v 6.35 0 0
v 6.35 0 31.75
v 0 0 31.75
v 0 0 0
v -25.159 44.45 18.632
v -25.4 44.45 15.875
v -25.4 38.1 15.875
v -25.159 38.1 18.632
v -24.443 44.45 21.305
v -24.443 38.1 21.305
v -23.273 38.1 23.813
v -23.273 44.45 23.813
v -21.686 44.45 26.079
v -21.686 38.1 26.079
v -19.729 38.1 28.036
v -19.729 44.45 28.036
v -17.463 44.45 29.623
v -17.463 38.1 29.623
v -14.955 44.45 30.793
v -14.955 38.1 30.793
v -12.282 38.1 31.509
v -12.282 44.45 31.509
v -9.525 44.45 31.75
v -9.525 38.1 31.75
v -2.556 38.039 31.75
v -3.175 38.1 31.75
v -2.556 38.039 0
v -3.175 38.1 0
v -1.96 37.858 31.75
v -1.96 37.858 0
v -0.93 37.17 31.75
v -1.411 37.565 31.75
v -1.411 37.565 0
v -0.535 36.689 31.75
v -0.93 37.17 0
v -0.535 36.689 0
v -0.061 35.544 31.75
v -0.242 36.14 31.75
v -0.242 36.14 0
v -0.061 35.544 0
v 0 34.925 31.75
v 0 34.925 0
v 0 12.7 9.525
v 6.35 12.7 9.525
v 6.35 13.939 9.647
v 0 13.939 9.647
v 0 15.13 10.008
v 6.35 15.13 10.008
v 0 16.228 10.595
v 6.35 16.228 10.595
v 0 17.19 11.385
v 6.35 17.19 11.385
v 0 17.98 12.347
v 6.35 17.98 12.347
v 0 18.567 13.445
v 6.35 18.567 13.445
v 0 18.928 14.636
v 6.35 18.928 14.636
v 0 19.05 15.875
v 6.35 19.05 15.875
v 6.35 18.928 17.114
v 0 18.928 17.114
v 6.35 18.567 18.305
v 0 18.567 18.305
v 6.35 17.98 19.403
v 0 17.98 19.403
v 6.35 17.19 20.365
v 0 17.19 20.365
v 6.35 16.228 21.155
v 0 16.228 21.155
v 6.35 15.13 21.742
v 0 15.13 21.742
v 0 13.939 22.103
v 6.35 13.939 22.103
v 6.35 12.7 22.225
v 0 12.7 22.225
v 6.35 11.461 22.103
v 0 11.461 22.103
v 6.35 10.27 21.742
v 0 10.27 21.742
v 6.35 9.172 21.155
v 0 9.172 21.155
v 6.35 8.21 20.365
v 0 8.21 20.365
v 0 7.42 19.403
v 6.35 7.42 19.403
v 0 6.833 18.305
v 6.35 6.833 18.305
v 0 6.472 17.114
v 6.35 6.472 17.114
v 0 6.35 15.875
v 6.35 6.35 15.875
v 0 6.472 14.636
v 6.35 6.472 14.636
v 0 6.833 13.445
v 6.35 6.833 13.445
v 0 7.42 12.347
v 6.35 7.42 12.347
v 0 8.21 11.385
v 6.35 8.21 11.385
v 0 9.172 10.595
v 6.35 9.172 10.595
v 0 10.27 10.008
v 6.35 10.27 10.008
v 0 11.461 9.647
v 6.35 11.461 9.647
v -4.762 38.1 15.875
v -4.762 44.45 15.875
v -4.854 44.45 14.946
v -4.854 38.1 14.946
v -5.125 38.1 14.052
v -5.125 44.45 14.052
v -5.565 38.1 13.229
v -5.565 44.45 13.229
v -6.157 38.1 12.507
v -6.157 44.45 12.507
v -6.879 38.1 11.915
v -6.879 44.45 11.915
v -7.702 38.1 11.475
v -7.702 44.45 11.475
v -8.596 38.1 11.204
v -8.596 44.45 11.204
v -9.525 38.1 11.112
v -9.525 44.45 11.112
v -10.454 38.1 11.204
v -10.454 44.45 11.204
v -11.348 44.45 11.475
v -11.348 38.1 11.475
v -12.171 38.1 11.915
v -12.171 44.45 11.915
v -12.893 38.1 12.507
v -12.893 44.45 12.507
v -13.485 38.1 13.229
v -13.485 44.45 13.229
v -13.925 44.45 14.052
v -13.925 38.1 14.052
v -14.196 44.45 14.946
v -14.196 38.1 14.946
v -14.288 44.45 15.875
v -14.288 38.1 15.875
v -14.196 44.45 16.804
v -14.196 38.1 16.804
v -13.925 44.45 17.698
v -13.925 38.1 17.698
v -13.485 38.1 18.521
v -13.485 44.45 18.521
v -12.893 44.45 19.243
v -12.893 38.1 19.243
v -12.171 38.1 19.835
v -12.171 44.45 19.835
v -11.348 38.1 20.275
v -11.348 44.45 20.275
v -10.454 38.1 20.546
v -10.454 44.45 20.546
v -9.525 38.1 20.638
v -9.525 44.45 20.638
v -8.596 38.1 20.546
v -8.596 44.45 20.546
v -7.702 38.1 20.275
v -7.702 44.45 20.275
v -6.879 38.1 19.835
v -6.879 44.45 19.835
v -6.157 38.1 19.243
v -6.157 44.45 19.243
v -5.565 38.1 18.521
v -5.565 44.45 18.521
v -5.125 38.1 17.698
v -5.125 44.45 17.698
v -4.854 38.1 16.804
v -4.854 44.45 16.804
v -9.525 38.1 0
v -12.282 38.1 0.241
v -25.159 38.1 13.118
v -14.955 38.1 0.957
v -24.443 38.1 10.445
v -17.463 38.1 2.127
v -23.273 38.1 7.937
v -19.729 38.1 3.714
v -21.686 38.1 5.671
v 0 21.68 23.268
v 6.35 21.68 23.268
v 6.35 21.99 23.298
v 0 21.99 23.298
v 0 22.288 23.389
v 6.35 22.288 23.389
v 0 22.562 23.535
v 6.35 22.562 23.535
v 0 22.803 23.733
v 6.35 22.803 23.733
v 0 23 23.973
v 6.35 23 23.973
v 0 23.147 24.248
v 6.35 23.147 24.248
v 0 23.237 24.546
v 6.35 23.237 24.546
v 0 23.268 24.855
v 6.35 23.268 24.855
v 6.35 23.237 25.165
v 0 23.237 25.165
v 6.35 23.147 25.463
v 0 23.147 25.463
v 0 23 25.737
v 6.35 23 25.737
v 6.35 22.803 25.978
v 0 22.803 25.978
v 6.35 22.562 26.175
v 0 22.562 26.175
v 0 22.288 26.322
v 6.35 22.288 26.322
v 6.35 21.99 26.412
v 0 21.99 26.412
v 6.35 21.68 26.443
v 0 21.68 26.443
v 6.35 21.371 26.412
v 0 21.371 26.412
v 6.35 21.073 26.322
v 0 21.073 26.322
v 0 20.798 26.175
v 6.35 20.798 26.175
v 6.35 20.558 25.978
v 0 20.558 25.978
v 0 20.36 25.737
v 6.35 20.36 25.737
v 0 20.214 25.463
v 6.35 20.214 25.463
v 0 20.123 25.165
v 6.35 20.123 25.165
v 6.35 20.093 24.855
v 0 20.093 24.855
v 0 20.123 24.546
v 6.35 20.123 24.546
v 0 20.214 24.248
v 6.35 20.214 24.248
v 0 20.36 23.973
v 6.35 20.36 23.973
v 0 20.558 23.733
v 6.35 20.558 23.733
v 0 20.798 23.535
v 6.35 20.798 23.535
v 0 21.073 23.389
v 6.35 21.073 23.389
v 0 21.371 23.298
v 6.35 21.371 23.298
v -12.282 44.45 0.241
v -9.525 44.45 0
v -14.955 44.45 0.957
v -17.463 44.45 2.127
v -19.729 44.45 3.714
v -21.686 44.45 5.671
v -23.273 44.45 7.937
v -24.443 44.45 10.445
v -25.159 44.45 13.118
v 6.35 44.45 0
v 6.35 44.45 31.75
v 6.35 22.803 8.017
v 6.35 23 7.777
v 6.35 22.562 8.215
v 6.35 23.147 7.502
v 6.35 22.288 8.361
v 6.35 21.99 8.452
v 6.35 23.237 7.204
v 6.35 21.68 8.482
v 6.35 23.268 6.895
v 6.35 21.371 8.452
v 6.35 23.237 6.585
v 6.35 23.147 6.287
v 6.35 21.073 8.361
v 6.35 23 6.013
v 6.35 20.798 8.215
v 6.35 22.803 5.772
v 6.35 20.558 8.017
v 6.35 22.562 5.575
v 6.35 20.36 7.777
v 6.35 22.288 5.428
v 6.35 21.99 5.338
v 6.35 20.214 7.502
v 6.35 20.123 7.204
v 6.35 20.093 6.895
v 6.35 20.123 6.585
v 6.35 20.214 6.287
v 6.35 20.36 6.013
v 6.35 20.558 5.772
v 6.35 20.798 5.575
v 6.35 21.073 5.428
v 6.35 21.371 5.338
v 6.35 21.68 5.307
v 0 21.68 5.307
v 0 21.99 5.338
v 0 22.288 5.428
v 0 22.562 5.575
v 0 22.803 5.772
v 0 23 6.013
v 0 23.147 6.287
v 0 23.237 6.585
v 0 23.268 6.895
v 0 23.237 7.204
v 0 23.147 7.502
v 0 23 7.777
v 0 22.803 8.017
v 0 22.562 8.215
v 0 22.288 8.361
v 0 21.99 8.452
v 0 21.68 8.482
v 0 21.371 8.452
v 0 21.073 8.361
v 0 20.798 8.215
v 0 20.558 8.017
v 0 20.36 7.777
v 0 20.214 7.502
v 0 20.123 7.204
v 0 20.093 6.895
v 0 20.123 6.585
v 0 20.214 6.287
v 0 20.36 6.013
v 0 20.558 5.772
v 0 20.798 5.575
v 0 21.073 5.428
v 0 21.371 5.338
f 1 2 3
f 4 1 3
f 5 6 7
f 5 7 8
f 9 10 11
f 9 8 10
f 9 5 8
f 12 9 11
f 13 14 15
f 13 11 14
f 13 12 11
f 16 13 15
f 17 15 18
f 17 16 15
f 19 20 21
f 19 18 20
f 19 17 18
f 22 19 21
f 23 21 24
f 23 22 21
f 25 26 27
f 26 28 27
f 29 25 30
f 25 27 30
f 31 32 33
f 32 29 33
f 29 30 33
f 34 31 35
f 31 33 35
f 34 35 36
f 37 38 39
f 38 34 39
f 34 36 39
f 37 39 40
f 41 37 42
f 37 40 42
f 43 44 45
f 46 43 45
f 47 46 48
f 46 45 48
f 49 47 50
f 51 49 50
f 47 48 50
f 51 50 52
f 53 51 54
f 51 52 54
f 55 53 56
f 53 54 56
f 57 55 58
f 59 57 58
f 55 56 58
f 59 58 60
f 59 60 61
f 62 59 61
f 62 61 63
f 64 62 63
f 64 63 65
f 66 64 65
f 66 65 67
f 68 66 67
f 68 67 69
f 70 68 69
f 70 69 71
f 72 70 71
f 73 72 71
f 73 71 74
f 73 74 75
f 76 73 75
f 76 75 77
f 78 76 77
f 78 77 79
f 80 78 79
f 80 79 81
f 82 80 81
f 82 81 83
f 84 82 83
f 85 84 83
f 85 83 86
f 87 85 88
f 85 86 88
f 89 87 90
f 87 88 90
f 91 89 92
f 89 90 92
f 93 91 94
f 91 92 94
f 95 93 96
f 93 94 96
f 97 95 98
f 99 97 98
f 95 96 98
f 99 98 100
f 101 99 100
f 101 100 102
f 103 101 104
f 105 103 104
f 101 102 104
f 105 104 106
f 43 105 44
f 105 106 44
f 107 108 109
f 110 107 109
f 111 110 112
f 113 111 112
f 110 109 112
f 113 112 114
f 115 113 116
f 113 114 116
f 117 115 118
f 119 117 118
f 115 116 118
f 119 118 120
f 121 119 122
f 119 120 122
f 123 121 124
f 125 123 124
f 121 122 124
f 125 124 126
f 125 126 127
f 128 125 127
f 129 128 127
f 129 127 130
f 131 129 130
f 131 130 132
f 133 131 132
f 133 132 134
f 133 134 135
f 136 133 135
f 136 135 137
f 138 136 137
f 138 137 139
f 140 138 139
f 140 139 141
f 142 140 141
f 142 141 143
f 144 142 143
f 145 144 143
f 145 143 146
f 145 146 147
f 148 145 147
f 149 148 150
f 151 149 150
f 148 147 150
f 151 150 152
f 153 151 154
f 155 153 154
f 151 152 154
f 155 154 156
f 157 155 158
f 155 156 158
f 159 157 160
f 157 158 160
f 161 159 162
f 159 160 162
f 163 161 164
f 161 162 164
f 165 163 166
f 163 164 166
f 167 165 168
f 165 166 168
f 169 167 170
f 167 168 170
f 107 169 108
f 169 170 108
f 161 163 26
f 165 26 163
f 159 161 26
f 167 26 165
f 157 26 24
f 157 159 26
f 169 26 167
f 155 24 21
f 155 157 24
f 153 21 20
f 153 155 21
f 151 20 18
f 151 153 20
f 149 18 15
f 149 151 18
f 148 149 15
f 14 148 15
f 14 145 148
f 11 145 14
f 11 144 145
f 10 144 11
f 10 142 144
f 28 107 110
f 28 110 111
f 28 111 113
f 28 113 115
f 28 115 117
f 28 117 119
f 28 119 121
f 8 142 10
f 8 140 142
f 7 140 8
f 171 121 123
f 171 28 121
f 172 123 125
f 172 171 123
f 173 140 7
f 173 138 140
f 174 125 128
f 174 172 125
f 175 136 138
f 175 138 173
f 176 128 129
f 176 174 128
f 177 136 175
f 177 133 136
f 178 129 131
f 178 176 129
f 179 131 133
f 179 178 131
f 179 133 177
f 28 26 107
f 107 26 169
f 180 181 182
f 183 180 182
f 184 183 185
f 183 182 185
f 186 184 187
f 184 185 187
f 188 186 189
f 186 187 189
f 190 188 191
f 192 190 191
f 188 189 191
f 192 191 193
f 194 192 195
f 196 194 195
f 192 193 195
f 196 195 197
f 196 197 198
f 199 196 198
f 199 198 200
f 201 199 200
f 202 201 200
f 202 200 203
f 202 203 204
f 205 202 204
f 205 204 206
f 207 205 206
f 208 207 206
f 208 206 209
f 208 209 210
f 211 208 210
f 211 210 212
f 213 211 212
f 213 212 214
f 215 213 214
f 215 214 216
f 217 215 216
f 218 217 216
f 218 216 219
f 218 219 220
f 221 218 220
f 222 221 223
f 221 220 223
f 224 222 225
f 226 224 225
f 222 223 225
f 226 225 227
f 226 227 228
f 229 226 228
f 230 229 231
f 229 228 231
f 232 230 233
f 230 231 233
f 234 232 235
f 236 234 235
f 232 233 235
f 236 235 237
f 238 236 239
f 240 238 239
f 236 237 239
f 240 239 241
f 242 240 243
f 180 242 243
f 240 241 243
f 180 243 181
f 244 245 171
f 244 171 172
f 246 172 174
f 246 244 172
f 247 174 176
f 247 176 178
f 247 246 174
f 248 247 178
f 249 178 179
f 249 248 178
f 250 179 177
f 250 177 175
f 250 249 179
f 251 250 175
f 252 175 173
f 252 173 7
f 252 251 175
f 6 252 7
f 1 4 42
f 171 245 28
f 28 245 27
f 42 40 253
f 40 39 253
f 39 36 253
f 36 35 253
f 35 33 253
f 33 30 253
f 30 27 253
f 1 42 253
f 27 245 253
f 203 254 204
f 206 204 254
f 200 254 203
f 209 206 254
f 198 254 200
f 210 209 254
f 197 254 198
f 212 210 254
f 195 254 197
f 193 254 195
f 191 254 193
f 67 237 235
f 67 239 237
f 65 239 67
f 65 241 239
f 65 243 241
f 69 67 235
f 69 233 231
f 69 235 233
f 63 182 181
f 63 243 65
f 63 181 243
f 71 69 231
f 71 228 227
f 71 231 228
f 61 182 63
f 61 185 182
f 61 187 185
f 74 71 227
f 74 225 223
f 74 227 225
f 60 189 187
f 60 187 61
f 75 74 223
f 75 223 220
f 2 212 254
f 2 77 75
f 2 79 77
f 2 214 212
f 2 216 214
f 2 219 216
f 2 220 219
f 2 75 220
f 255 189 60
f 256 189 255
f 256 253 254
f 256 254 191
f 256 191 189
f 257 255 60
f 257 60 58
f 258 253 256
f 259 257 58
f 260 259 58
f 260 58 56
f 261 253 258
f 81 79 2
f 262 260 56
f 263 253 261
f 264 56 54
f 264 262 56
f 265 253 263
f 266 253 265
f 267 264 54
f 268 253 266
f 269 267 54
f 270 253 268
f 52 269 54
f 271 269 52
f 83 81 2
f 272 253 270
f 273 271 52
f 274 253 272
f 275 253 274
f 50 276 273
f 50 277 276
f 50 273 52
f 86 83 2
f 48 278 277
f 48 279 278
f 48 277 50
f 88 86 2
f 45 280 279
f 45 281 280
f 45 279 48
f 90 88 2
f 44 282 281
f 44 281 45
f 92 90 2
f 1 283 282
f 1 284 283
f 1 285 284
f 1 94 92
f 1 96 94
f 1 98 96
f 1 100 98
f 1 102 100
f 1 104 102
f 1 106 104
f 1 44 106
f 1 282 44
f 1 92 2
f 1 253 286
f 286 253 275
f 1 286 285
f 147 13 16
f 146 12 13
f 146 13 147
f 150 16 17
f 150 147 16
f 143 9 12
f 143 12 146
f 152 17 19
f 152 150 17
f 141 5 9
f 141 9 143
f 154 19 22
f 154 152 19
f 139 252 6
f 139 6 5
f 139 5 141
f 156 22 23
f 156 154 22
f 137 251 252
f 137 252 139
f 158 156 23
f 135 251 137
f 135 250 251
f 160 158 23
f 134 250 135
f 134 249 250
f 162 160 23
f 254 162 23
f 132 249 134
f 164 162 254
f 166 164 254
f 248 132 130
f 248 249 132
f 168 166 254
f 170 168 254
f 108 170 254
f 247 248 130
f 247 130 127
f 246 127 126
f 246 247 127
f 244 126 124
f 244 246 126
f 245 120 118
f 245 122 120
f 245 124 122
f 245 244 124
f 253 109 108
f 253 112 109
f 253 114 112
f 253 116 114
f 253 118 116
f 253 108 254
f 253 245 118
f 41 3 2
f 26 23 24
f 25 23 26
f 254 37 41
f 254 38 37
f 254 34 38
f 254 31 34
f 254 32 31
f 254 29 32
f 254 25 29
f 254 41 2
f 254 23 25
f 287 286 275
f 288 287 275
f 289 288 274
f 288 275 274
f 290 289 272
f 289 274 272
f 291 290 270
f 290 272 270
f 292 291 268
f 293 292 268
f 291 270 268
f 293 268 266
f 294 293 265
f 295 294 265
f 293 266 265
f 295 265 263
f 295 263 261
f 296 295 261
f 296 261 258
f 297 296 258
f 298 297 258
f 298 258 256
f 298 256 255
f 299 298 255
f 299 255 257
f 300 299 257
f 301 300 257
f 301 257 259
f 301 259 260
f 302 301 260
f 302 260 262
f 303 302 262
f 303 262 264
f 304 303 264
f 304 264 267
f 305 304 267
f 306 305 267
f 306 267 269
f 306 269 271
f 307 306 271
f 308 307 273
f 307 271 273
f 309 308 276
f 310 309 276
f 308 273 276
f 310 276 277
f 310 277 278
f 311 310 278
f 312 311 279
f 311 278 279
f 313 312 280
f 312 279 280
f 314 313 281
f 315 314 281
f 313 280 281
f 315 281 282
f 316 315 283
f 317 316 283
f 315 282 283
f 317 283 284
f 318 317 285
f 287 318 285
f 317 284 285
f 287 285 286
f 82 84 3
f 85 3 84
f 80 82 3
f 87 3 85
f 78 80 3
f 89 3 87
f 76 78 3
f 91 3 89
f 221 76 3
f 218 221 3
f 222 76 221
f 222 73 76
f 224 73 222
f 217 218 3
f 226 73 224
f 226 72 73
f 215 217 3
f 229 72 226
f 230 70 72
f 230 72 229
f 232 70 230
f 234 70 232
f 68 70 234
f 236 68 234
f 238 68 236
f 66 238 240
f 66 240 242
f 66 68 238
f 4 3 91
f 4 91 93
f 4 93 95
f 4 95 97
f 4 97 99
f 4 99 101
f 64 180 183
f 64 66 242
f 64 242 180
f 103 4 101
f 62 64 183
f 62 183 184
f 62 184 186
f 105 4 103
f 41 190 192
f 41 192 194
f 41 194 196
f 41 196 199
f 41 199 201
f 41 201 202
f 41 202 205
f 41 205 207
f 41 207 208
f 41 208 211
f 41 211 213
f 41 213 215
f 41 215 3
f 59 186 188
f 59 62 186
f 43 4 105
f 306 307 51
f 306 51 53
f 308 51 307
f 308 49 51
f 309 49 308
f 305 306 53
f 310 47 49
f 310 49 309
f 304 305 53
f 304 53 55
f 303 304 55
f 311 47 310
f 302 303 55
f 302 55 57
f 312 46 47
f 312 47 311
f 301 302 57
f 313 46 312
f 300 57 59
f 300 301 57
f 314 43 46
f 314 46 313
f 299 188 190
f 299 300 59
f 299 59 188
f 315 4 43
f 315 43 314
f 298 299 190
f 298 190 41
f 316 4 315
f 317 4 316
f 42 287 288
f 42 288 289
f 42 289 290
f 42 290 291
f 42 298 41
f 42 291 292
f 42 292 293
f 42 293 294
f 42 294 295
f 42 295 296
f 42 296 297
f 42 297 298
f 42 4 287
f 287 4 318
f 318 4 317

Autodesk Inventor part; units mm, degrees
ref_plane "YZ Plane" through (0, 0, 0) normal (1, 0, 0) x (0, 1, 0)
ref_plane "XZ Plane" through (0, 0, 0) normal (0, 1, 0) x (-1, 0, 0)
ref_plane "XY Plane" through (0, 0, 0) normal (0, 0, 1) x (1, 0, 0)
sketch "Sketch1" plane through (0, 0, 0) normal (0, 0, 1) x (1, 0, 0)
  line L0 (0, 0) -> (0, 34.925)
  line L1 (-3.175, 38.1) -> (-25.4, 38.1)
  line L2 (-25.4, 38.1) -> (-25.4, 44.45)
  line L3 (-25.4, 44.45) -> (6.35, 44.45)
  line L4 (6.35, 44.45) -> (6.35, 0)
  line L5 (6.35, 0) -> (0, 0)
  arc A0 (0, 34.925) -> (-3.175, 38.1) centre (-3.175, 34.925) ccw
  point P0 (0, 38.1)
  dimension "d0" = 6.35
  dimension "d1" = 38.1
  dimension "d2" = 25.4
  dimension "d3" = 3.175
extrude "Extrusion1" add sketch "Sketch1" along normal blind 31.75
sketch "Sketch2" plane through (6.35, 0, 0) normal (1, 0, 0) x (0, 0, -1)
  line L0 (0, 38.1) -> (-31.75, 38.1) construction
  line L1 (0, 0) -> (-31.75, 0) construction
  line L2 (-15.875, 38.1) -> (-15.875, 0) construction
  line L3 (0, 0) -> (-31.75, 0) construction
  circle A0 centre (-15.875, 12.7) radius 6.35
  line L4 (0, 44.45) -> (-31.75, 44.45) construction
  line L5 (-15.875, 12.7) -> (-31.75, 28.575) construction
  line L6 (-31.75, 0) -> (-31.75, 44.45) construction
  circle A1 centre (-24.8553, 21.6803) radius 1.5875
  circle A2 centre (-6.8947, 21.6803) radius 1.5875
  dimension "d15" = 12.7
  dimension "d21" = 31.75
  dimension "d25" = 45
  dimension "d26" = 3.175
  dimension "d27" = 12.7
extrude "Extrusion2" cut sketch "Sketch2" against normal through all
sketch "Sketch3" plane through (-25.4, 44.45, 0) normal (0, 1, 0) x (1, 0, 0)
  line L0 (0, 0) -> (0, -31.75) construction
  line L1 (0, 0) -> (0, -31.75) construction
  line L2 (0, -15.875) -> (15.875, -15.875) construction
  circle A0 centre (15.875, -15.875) radius 4.7625
  dimension "d17" = 9.525
  dimension "d18" = 15.875
extrude "Extrusion3" cut sketch "Sketch3" against normal through all
fillet "Fillet1" radius 15.875 2 edges at (-25.4, 41.275, 31.75) (-25.4, 41.275, 0)
equation "\"d7\" = d6"
equation "\"d6\" = 9.525"
properties part number "Corner Hinge"
